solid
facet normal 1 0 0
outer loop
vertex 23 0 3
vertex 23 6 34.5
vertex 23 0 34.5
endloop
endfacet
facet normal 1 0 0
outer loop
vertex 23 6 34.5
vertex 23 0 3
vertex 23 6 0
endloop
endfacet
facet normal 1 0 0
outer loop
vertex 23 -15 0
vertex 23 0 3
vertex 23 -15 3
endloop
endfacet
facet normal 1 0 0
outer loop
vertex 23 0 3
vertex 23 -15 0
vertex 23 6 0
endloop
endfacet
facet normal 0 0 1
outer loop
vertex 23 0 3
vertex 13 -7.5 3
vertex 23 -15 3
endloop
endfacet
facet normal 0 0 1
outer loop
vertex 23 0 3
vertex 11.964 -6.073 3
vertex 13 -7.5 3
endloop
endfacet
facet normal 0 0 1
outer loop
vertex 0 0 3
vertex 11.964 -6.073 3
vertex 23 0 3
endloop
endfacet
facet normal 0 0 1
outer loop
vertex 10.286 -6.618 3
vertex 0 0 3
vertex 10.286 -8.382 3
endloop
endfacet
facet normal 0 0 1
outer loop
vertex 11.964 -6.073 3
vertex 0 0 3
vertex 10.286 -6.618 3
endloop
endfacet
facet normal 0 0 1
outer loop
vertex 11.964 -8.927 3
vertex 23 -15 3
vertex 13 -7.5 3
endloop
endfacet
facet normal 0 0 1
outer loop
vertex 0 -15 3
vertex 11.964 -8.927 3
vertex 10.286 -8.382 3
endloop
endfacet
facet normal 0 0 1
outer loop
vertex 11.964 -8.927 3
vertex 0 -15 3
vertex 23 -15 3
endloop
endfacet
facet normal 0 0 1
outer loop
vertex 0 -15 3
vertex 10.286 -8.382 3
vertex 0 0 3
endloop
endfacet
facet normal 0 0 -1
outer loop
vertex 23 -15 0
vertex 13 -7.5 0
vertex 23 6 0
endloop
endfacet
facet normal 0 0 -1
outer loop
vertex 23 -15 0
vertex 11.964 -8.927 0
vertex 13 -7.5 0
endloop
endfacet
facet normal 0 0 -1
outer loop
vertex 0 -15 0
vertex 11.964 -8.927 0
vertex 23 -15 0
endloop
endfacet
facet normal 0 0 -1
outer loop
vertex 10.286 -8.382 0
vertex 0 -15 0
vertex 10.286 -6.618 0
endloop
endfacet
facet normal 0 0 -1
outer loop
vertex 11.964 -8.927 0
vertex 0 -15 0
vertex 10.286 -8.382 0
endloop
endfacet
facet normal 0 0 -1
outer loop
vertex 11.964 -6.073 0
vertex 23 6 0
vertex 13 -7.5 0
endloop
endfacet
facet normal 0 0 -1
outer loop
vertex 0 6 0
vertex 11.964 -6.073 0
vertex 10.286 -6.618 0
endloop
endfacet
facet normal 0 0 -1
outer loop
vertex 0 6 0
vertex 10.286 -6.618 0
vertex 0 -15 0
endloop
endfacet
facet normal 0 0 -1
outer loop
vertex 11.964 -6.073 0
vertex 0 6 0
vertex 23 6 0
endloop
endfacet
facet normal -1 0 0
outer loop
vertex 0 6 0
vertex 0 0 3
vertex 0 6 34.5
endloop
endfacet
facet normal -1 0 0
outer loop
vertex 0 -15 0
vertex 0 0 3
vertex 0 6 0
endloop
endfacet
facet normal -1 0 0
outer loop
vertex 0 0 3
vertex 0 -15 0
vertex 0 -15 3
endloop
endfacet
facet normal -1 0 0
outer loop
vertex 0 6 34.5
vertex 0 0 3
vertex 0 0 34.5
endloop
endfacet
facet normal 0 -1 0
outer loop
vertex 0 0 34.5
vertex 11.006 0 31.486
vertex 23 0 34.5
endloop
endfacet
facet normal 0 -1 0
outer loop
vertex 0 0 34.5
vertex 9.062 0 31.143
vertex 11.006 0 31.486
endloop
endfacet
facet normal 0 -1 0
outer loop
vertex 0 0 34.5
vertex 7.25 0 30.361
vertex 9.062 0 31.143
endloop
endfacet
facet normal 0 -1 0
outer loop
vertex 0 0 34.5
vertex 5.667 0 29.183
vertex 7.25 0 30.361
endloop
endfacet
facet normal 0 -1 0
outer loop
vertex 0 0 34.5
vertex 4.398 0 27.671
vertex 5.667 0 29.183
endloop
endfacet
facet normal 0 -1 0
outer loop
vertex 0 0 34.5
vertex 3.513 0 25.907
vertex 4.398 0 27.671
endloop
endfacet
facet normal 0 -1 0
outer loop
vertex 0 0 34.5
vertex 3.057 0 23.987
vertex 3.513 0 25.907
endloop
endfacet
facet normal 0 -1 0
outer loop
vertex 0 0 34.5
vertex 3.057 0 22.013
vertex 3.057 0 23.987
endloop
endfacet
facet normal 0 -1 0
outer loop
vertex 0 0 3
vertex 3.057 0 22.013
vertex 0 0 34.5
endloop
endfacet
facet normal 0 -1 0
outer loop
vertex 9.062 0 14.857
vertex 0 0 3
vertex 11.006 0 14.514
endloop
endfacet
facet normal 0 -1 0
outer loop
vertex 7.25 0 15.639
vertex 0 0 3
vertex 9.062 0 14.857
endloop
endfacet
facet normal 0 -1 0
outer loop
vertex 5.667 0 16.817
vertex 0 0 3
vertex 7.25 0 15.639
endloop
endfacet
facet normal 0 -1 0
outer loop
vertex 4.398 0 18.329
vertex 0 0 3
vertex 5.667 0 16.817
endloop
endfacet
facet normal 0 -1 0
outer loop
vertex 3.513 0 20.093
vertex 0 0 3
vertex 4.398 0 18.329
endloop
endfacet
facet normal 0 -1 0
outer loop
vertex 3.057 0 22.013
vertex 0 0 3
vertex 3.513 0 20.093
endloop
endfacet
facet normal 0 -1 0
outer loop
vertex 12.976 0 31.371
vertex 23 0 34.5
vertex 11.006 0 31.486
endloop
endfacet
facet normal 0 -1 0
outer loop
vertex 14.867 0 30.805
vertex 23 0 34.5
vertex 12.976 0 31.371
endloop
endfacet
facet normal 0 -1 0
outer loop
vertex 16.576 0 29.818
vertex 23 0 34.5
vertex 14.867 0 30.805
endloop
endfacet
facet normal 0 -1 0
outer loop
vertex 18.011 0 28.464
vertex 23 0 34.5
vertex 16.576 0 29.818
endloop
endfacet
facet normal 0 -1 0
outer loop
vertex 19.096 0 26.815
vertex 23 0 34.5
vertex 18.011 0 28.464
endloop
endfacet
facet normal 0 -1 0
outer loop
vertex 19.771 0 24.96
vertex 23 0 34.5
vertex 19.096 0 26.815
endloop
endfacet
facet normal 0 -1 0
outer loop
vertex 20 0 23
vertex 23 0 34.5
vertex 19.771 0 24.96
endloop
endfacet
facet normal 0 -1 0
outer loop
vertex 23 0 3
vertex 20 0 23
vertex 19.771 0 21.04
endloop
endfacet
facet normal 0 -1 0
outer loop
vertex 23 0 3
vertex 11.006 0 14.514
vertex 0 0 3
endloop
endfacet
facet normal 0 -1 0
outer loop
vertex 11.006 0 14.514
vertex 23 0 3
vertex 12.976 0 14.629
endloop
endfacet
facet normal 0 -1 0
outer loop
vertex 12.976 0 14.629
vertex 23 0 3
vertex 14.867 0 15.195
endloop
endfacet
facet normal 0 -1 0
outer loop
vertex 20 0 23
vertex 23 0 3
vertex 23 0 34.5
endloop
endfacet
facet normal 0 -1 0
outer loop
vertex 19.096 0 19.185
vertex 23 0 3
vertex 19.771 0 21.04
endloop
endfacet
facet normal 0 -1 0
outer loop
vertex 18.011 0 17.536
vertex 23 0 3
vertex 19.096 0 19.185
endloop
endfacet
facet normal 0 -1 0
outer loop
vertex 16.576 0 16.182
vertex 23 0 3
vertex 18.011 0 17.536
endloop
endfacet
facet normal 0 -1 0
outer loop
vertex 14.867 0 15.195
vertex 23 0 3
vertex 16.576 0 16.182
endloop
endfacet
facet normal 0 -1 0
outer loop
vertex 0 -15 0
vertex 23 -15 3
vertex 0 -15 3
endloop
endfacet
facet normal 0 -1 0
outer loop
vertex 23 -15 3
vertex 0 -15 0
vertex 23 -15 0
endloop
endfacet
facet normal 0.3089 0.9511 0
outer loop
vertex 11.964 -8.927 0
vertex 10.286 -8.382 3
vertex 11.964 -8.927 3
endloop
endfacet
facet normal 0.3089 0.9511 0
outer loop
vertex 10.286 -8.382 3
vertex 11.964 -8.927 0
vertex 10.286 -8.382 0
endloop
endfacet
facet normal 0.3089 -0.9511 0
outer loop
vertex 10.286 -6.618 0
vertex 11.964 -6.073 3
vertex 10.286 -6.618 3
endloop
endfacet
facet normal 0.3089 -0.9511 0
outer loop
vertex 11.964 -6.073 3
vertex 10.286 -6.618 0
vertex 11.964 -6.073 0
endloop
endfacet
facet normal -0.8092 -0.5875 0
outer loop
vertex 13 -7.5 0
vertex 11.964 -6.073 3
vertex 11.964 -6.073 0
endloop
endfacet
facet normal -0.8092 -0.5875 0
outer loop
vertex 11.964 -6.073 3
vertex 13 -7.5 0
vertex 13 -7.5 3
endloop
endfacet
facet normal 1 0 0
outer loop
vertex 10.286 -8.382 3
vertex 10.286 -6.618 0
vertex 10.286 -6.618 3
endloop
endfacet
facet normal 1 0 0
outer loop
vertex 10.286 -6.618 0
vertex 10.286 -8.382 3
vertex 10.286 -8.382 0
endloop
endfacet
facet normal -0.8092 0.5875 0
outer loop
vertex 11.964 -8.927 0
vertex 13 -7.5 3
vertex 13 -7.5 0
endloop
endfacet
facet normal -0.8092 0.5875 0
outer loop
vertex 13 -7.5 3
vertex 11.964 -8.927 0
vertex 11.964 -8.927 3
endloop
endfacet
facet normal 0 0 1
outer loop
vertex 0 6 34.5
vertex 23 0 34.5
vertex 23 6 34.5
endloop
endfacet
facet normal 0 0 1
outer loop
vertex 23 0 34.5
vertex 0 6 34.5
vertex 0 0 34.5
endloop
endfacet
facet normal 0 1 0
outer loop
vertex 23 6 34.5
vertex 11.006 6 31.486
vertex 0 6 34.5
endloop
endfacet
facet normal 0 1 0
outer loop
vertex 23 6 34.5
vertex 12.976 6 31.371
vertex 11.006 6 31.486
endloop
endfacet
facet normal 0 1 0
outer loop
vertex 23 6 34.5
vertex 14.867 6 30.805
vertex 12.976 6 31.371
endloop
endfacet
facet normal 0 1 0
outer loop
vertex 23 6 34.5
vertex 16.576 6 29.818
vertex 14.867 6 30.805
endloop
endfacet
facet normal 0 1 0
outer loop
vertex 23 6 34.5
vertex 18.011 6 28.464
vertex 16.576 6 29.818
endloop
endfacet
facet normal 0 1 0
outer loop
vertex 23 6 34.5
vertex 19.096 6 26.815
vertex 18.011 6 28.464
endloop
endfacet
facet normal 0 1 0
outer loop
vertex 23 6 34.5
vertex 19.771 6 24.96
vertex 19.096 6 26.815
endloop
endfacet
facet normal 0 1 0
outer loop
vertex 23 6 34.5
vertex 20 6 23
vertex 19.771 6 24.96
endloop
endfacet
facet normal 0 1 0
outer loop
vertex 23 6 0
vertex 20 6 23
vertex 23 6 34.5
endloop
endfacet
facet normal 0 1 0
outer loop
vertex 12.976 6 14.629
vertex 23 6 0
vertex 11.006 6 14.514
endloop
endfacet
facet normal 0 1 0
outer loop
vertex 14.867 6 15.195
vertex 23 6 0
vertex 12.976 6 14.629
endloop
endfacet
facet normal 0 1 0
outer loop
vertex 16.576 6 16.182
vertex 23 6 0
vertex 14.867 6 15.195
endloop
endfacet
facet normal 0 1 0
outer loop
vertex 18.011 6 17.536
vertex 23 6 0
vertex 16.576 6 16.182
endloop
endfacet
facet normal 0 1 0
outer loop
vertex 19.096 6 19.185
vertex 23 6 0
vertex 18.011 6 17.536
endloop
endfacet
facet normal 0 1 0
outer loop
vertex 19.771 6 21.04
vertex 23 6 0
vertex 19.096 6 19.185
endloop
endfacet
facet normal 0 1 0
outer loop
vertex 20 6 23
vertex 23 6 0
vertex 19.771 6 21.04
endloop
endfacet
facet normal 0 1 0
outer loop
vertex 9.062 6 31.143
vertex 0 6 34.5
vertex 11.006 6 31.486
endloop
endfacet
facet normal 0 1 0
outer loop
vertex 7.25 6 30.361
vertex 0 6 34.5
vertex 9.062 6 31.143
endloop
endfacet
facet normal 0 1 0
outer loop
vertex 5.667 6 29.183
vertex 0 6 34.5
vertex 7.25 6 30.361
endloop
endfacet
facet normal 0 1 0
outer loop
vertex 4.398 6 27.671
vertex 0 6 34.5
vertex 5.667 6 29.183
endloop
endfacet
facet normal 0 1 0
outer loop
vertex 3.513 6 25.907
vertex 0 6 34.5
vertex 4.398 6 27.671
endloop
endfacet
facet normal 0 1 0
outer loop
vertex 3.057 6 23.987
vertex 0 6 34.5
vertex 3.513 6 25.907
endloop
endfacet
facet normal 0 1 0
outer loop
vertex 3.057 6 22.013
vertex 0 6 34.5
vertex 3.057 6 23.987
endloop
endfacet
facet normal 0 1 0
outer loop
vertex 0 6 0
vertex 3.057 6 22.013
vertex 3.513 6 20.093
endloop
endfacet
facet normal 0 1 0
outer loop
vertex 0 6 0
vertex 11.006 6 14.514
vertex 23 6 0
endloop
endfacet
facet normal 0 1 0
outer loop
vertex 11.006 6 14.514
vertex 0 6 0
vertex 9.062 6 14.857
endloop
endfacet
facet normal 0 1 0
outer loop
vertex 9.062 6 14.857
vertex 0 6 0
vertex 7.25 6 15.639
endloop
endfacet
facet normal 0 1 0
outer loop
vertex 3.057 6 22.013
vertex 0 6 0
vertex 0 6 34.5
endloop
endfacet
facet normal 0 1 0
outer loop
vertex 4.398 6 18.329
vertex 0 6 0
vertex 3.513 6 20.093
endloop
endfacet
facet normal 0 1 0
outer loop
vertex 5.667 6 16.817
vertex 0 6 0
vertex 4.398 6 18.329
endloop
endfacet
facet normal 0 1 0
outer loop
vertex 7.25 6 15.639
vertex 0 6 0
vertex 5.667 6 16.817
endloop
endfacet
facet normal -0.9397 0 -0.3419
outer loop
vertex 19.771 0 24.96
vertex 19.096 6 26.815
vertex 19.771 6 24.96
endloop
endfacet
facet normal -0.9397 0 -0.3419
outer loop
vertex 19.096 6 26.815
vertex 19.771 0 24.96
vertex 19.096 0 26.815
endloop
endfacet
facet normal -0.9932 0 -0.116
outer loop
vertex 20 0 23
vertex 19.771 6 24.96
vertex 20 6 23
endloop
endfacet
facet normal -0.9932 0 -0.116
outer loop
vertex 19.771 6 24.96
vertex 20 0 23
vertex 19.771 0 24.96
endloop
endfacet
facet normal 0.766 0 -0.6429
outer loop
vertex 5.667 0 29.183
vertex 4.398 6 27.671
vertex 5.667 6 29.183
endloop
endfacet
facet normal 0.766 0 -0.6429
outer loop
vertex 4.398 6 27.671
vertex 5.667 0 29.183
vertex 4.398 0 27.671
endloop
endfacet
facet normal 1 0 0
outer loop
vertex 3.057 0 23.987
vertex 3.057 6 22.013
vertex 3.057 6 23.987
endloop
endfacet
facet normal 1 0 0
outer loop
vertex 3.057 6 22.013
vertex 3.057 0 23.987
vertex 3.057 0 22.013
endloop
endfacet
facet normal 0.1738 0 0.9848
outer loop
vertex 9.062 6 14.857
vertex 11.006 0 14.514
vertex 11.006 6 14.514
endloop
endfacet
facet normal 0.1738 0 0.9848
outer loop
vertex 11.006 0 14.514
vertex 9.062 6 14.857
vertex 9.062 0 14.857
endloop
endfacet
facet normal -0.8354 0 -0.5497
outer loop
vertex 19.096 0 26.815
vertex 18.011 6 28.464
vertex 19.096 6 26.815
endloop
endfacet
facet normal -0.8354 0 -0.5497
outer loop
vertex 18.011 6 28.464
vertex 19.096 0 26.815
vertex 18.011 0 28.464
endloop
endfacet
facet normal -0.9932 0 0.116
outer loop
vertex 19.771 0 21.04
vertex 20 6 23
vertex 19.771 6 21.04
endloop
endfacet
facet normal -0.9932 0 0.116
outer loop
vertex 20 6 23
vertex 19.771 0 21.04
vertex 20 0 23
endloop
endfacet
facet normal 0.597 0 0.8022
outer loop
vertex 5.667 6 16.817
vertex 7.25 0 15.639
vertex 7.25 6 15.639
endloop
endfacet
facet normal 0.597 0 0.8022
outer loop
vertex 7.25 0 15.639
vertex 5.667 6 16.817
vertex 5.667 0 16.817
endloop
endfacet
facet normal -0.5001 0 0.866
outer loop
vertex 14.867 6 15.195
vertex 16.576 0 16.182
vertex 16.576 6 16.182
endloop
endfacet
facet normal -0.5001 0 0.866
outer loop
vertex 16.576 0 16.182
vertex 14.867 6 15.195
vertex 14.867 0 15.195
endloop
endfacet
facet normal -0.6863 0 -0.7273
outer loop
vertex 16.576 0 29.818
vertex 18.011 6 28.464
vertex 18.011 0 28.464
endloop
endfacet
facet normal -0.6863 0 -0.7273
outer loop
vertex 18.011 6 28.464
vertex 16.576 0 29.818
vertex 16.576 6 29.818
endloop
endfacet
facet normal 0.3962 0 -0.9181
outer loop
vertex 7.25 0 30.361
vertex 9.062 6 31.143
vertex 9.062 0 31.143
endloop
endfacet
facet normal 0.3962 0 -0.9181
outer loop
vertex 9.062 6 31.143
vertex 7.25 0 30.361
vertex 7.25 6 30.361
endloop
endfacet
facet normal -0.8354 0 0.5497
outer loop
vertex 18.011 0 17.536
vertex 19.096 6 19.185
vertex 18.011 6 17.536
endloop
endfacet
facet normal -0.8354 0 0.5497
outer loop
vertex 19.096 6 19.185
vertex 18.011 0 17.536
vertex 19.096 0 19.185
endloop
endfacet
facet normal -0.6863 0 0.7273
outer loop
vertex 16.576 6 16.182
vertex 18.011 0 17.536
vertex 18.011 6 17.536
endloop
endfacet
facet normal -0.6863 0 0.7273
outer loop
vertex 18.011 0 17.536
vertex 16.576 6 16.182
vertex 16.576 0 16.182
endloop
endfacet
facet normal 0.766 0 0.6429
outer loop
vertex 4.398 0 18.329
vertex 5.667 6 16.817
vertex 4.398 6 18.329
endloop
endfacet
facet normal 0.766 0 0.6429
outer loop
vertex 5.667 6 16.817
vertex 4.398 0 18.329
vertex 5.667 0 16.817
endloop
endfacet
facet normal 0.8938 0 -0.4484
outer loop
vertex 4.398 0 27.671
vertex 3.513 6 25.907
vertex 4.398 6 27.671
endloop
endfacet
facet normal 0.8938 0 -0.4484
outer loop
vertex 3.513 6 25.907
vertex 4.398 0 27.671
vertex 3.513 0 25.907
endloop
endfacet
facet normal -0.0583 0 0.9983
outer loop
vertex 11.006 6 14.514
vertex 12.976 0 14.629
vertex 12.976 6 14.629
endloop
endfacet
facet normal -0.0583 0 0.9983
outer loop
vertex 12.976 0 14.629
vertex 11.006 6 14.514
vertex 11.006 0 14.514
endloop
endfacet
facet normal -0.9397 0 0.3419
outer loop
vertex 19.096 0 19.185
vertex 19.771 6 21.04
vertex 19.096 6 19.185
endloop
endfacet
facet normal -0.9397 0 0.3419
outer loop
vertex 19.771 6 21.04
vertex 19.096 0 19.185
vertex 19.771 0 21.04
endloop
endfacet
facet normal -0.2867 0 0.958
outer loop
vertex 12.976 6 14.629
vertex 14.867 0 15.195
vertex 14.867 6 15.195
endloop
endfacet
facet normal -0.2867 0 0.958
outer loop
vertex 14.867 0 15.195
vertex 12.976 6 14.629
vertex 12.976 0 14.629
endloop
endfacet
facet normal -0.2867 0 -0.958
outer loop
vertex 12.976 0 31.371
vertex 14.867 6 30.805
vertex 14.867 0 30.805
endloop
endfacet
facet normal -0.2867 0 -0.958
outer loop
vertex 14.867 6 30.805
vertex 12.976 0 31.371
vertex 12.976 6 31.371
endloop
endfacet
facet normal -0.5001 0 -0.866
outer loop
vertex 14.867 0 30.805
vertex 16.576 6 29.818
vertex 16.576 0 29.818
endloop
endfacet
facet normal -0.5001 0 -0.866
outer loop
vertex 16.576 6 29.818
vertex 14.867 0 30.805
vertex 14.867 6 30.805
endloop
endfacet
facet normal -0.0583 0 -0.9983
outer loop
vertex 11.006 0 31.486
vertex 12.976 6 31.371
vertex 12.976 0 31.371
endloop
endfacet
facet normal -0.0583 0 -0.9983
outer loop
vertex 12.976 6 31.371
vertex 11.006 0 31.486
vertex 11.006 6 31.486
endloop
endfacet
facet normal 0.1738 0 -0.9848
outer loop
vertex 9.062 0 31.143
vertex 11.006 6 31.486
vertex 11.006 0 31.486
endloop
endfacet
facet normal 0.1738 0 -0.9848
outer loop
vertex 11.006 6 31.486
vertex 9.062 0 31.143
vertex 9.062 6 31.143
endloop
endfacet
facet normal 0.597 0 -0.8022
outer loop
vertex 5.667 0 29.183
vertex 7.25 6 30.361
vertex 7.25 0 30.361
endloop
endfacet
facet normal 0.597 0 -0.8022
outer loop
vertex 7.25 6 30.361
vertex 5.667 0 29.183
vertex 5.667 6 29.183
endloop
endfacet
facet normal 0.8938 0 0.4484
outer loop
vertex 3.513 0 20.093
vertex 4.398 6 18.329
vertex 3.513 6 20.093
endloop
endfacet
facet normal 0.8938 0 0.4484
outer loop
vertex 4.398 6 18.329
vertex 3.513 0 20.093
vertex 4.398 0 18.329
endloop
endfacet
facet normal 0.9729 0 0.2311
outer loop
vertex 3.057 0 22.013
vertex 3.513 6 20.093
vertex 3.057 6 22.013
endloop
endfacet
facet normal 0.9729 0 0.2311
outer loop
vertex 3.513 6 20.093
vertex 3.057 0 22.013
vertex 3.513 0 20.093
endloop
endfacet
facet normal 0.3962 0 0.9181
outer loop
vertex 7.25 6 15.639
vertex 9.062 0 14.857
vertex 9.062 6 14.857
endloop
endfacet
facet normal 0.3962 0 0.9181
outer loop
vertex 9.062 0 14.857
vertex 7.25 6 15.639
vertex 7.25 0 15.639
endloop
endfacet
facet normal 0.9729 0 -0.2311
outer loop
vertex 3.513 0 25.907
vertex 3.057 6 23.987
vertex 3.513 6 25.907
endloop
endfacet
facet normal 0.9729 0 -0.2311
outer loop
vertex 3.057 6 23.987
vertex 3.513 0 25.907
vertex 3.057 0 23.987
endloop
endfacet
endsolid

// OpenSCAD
motor_h = 40;
base_thickness = 3;

bearing_r = 8.5;
bearing_h = 6;
bearing_wall = 3;
bearing_heigth = (motor_h/2)+base_thickness;

body_w = 2*bearing_r+2*bearing_wall;

feet_h = 3;
feet_l = 15;


module body()
{
	cube([body_w, bearing_h, bearing_heigth + bearing_r + (body_w-(2*bearing_r))/2]);
}

module bearing()
{
	translate([body_w/2, bearing_h+1, bearing_heigth])
		rotate(a=90, v=[1,0,0])
			cylinder(r=bearing_r, h=bearing_h+2);
}

module feet()
{
	difference()
	{
		translate([0, -1*feet_l, 0])
			cube([body_w, feet_l, feet_h]);

		translate([body_w/2, -1*feet_l/2, -1])
			cylinder(r=1.5, h=feet_h+2);
	}
}


difference()
{
	union()
	{
		body();
		feet();	
	}

	bearing();
}
